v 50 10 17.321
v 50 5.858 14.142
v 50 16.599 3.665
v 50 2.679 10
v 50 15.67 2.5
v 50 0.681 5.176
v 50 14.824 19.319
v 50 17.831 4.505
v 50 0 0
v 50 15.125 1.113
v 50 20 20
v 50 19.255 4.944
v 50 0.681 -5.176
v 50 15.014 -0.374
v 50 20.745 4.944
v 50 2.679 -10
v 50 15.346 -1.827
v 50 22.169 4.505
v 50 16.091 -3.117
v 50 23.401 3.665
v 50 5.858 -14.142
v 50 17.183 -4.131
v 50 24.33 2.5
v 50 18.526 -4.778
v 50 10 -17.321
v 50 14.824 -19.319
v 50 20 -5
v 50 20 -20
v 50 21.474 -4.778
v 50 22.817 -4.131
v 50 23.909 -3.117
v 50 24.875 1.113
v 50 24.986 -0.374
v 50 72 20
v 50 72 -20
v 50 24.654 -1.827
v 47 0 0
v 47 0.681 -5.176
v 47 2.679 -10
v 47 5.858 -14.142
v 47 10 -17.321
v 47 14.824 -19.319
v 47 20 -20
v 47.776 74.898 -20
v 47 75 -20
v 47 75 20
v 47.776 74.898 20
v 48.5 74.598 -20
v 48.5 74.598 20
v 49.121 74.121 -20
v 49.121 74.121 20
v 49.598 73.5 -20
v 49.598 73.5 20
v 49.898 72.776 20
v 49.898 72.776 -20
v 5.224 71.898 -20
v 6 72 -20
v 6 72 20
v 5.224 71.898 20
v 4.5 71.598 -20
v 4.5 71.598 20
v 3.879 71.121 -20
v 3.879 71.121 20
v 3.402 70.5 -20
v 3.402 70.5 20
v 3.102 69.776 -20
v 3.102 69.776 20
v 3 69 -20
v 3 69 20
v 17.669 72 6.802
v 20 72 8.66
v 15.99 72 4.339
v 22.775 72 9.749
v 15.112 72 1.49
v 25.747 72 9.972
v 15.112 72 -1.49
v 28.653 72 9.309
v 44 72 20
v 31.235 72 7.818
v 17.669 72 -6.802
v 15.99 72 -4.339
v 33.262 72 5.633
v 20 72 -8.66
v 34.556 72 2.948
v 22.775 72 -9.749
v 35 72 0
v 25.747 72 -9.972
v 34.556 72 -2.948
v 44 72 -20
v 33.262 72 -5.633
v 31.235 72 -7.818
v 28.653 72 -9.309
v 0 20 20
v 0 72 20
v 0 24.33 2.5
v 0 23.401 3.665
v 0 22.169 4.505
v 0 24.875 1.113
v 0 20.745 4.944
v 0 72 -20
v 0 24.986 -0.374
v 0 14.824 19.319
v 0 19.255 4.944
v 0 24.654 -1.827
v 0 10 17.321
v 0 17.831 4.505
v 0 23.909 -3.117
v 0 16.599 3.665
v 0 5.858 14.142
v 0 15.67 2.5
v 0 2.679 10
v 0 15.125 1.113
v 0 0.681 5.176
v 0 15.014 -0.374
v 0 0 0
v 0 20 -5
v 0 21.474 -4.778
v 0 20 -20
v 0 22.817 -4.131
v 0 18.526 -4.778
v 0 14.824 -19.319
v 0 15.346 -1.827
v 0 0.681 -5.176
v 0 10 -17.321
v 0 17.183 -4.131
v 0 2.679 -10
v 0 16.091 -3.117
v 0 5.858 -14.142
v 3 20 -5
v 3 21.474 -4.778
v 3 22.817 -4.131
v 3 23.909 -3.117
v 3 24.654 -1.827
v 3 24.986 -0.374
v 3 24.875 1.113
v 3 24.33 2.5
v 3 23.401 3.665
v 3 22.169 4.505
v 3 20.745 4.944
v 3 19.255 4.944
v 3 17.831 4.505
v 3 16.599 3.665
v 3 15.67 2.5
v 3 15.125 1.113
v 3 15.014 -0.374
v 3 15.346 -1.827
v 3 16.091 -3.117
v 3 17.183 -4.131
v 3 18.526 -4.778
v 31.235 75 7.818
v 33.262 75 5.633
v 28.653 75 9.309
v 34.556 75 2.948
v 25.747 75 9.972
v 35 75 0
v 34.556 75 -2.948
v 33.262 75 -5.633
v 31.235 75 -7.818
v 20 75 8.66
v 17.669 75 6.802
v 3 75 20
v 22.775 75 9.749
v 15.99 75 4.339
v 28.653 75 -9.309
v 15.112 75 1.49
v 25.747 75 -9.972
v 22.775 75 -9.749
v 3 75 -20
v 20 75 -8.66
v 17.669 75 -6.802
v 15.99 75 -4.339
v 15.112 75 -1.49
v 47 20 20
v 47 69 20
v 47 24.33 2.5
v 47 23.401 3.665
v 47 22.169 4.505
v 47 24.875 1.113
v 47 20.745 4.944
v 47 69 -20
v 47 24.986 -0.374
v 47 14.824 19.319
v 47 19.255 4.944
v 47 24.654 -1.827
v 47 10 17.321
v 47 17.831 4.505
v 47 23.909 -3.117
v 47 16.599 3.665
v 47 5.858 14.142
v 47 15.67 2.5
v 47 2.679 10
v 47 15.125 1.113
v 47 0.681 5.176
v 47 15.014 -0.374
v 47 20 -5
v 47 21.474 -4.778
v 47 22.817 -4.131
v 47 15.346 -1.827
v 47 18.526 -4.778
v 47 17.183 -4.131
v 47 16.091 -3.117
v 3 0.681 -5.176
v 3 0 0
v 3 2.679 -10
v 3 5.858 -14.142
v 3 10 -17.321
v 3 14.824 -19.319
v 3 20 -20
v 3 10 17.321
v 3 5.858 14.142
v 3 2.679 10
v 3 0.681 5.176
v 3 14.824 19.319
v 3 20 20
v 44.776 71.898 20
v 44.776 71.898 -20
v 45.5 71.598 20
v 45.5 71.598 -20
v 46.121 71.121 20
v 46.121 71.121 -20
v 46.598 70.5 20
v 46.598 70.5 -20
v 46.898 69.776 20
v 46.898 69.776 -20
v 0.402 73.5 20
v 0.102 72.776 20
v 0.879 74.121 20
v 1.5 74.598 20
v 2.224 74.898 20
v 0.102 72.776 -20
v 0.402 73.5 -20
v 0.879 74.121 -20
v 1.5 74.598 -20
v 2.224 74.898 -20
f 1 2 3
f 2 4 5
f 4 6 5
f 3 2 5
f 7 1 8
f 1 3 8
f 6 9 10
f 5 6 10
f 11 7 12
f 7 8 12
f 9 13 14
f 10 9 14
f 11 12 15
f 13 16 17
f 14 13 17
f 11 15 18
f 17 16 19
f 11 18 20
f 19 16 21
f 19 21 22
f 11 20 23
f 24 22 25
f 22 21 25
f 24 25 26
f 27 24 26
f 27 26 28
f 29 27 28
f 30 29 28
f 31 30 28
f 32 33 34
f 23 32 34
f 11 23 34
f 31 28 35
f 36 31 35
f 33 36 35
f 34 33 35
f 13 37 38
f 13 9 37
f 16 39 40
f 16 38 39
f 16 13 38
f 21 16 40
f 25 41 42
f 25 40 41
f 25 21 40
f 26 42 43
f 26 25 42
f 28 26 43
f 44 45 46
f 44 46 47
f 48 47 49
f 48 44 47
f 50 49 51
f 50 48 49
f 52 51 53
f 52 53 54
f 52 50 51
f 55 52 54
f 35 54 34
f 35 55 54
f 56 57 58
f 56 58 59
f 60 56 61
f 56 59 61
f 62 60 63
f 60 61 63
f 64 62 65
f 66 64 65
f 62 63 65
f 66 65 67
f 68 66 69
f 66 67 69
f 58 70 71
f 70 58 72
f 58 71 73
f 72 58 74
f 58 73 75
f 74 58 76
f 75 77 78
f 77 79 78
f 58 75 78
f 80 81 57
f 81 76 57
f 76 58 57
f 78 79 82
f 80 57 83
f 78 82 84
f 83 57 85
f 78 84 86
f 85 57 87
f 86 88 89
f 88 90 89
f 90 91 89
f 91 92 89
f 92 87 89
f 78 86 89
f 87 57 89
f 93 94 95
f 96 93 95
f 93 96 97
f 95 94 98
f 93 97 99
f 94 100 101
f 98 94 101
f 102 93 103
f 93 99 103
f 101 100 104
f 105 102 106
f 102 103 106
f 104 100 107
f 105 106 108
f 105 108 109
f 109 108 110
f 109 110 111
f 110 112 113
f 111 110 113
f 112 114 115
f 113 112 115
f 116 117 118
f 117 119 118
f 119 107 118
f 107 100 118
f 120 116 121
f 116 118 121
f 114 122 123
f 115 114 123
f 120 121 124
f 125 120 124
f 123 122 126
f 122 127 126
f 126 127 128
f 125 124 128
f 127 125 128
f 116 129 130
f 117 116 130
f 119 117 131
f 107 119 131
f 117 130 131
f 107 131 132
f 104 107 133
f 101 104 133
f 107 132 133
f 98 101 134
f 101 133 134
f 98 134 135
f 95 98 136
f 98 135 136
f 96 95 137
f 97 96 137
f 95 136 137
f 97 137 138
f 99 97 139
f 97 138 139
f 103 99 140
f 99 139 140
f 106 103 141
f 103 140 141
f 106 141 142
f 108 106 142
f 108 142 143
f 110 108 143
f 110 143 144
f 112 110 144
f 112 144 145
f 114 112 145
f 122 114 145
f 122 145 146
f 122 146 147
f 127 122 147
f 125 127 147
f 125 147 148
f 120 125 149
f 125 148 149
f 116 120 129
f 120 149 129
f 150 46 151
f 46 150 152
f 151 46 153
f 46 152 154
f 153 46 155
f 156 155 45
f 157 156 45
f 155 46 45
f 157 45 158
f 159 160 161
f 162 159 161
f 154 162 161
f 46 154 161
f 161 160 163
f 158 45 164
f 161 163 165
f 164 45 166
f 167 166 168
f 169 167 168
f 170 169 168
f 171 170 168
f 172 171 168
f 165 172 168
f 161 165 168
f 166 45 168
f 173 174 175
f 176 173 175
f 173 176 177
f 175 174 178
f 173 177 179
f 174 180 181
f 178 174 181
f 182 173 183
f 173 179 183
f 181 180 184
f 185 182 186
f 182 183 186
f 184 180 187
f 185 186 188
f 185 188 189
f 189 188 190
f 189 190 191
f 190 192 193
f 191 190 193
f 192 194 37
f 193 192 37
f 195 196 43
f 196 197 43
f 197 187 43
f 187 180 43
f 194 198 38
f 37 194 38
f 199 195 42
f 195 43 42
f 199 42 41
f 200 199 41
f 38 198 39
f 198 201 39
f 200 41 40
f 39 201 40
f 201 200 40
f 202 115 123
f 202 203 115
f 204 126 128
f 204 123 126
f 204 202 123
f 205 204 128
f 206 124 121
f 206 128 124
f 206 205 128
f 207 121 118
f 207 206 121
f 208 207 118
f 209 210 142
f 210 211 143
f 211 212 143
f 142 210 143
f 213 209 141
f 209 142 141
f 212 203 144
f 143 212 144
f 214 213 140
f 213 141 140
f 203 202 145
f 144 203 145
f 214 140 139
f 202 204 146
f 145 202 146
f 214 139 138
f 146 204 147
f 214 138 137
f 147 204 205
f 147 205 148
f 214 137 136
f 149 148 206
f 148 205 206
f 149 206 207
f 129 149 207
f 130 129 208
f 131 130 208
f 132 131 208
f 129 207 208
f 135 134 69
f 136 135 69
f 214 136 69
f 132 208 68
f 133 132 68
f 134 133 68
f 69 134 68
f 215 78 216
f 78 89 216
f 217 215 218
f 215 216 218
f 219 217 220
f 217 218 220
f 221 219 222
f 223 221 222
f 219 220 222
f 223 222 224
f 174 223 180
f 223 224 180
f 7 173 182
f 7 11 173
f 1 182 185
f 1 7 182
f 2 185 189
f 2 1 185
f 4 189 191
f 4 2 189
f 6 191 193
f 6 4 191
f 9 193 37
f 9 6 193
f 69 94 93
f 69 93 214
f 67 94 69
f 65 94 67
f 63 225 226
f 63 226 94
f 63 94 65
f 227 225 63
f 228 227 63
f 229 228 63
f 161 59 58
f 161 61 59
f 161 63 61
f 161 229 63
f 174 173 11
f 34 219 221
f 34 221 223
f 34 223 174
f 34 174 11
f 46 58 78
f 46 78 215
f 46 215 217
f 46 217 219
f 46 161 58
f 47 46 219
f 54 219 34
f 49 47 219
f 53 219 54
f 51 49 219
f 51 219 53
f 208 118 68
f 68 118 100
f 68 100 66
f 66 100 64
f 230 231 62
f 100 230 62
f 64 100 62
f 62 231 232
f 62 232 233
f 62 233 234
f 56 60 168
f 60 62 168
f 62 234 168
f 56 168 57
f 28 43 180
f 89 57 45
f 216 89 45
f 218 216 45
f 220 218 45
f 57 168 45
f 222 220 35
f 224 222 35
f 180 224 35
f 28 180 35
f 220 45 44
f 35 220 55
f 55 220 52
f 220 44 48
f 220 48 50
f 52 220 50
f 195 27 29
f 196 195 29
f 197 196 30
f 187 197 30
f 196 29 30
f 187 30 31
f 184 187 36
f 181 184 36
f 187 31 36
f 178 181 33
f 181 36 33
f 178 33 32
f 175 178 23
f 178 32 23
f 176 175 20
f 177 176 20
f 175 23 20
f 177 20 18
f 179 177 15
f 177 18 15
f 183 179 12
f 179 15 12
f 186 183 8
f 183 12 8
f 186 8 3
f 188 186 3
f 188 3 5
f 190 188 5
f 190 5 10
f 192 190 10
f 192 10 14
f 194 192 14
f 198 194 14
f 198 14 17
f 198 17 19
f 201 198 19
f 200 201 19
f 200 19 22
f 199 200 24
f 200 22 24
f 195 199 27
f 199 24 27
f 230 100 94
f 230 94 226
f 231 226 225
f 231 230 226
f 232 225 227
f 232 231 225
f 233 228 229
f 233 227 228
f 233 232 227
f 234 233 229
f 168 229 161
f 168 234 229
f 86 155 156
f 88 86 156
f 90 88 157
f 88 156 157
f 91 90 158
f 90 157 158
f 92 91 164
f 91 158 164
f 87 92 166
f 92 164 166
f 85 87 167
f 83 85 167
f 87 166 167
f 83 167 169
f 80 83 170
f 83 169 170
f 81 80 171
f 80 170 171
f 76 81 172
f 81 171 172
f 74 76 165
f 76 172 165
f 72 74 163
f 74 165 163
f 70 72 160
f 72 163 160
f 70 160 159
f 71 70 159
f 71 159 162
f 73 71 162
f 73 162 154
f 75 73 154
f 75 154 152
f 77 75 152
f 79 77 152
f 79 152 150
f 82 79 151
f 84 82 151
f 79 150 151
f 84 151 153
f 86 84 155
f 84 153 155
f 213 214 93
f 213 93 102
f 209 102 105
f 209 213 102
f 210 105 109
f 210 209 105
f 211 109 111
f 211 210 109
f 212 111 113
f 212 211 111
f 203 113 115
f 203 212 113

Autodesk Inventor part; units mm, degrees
ref_plane "YZ Plane" through (0, 0, 0) normal (1, 0, 0) x (0, 1, 0)
ref_plane "XZ Plane" through (0, 0, 0) normal (0, 1, 0) x (-1, 0, 0)
ref_plane "XY Plane" through (0, 0, 0) normal (0, 0, 1) x (1, 0, 0)
sketch "Sketch1" plane through (0, 0, 0) normal (0, 0, 1) x (1, 0, 0)
  line L0 (0, 0) -> (3, 0)
  line L1 (3, 0) -> (3, 72)
  line L2 (3, 72) -> (47, 72)
  line L3 (47, 72) -> (47, 0)
  line L4 (47, 0) -> (50, 0)
  line L5 (50, 0) -> (50, 75)
  line L6 (50, 75) -> (0, 75)
  line L7 (0, 75) -> (0, 0)
  dimension "d0" = 75
  dimension "d2" = 3
  dimension "d3" = 3
  dimension "d4" = 3
  dimension "d21" = 50
extrude "Extrusion1" add sketch "Sketch1" along normal mid plane 40
fillet "Fillet1" radius 3 1 edges at (50, 75, 0)
fillet "Fillet2" radius 3 1 edges at (0, 75, 0)
fillet "Fillet3" radius 20 1 edges at (48.5, 0, 20)
fillet "Fillet4" radius 20 1 edges at (1.5, 0, 20)
fillet "Fillet5" radius 20 1 edges at (48.5, 0, -20)
fillet "Fillet6" radius 20 1 edges at (1.5, 0, -20)
sketch "Sketch2" plane through (50, 72, 20) normal (1, 0, 0) x (0, 0, -1)
  arc A0 (0, -52) -> (40, -52) centre (20, -52) ccw projected
  circle A1 centre (20, -52) radius 5
  point P0 (20, -72)
  dimension "d13" = 10
extrude "Extrusion2" cut sketch "Sketch2" against normal through all
sketch "Sketch3" plane through (47, 75, 20) normal (0, 1, 0) x (1, 0, 0)
  line L0 (-47, 20) -> (3, 20) construction
  line L1 (3, 25) -> (3, 15) projected
  circle A0 centre (-22, 20) radius 10
  dimension "d16" = 20
extrude "Extrusion3" cut sketch "Sketch3" against normal blind 10
fillet "Fillet7" radius 3 1 edges at (47, 72, 0)
fillet "Fillet8" radius 3 1 edges at (3, 72, 0)
properties part number "Part1dia7demaio" material "Steel, Carbon"
